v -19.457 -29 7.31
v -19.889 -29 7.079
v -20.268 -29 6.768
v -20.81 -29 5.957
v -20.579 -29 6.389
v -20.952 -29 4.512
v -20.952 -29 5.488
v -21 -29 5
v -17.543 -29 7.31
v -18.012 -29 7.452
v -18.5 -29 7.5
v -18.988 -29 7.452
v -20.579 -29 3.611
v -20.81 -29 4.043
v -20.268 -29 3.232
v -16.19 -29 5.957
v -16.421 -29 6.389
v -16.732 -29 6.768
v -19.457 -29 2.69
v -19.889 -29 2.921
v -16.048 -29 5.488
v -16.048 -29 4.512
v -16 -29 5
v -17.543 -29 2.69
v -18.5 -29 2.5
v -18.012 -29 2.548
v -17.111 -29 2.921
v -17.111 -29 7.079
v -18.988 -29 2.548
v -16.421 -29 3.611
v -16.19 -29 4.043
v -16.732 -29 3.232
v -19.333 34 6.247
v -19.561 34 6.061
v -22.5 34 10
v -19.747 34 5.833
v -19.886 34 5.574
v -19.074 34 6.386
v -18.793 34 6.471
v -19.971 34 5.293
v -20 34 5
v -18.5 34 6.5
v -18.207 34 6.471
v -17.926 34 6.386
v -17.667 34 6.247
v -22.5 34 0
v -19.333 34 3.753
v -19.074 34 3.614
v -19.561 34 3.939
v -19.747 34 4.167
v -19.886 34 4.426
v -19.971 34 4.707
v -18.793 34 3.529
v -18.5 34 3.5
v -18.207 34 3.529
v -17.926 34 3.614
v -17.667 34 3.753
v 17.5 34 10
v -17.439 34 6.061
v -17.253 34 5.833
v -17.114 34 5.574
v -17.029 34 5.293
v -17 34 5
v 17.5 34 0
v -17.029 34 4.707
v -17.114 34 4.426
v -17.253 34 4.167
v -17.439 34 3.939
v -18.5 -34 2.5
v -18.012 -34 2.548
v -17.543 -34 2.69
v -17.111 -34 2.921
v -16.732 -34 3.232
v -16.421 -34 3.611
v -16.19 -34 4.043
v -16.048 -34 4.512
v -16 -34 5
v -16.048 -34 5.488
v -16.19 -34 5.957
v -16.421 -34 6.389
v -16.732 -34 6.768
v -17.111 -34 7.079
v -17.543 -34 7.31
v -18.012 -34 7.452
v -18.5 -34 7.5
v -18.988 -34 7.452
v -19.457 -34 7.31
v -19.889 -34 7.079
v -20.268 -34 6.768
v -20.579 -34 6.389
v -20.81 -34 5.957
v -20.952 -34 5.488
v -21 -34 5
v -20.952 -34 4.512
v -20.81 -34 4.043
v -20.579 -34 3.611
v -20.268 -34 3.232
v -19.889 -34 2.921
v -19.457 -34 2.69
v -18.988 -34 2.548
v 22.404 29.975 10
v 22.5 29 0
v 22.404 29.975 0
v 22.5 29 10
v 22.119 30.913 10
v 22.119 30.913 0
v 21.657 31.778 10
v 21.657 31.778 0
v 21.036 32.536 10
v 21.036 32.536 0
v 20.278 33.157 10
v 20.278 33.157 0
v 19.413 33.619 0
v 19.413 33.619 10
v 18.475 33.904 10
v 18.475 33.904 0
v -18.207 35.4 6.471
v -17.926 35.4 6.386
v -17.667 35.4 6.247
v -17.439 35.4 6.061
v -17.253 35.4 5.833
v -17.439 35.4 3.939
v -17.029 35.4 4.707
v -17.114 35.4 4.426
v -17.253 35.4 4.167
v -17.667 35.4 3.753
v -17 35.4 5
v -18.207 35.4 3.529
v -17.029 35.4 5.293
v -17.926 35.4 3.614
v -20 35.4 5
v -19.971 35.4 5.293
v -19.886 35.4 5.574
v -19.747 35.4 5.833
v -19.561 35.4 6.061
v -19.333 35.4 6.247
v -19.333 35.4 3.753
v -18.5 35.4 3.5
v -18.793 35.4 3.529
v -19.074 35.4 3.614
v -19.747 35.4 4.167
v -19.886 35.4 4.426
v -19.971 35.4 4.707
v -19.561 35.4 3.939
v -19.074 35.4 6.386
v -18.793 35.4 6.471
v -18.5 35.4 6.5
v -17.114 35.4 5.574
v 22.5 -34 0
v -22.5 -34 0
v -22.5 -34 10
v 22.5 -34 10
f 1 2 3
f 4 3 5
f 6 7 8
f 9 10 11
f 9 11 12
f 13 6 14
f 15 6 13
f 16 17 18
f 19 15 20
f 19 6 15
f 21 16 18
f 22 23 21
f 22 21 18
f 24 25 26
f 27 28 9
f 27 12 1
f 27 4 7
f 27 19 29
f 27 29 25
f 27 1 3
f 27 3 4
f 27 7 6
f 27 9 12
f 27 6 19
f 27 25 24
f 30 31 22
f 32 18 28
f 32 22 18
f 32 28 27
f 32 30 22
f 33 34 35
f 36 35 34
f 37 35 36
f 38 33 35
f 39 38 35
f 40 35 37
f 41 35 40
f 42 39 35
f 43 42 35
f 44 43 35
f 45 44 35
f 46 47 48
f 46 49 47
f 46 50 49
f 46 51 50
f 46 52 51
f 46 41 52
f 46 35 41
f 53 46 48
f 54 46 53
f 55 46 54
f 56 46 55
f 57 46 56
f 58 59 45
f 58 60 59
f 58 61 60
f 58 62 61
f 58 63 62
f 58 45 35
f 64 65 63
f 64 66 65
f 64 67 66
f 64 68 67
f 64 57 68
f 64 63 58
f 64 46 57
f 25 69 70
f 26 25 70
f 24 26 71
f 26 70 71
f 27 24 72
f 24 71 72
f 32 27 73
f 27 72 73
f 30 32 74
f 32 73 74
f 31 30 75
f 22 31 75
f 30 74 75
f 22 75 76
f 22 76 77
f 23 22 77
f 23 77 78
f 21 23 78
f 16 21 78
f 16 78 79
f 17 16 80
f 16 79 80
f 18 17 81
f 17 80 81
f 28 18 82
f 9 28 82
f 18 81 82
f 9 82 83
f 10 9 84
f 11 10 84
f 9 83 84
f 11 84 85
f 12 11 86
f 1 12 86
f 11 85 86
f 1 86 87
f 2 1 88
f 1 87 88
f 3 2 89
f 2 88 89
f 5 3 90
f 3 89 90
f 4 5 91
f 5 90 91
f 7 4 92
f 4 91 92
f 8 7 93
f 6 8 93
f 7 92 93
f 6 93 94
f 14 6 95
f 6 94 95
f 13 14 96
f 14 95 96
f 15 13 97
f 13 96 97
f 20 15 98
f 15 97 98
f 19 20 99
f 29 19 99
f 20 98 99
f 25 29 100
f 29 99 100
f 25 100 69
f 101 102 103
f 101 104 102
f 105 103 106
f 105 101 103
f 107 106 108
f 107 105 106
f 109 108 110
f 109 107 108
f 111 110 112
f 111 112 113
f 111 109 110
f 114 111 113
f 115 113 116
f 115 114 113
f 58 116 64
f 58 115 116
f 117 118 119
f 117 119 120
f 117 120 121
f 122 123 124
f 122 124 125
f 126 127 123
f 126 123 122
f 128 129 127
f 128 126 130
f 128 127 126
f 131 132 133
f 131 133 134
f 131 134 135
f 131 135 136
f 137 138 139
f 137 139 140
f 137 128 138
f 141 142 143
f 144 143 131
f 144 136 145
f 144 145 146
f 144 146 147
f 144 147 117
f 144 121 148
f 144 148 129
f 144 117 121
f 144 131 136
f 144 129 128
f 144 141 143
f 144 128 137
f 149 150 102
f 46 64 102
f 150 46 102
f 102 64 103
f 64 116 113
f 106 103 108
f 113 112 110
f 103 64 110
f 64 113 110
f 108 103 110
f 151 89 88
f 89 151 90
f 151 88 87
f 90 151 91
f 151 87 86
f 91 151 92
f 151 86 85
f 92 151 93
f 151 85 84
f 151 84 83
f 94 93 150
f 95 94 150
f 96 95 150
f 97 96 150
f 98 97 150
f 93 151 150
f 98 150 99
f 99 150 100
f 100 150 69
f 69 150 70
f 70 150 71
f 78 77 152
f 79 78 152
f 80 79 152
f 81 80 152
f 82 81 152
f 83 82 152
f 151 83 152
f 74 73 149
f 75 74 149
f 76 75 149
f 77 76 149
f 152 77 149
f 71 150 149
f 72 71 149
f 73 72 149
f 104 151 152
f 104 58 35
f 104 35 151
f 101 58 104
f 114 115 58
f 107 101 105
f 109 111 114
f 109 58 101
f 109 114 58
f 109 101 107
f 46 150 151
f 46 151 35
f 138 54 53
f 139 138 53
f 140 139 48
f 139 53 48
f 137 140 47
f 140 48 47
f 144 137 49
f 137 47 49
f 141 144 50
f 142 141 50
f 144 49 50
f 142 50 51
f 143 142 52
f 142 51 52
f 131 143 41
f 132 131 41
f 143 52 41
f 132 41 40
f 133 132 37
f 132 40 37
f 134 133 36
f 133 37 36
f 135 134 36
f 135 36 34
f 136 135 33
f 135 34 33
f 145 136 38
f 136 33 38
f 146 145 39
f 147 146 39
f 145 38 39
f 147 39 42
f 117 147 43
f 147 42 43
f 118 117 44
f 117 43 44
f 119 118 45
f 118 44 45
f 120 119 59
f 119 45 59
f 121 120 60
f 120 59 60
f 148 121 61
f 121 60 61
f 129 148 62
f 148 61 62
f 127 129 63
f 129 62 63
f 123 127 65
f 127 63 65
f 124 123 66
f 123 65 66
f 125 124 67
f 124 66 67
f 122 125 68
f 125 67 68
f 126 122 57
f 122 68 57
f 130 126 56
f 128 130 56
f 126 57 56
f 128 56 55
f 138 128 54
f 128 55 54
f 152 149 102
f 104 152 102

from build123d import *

# Parameters (mm, degrees)
SKETCH_1_W           = 45
SKETCH_1_H           = 68
EXTRUDE_1_DEPTH      = 10
FILLET_1_R           = 5
SKETCH_2_R           = 1.5
EXTRUDE_2_DEPTH      = 1.4
SKETCH_3_OUTSIDE_W   = 63.662
SKETCH_3_OUTSIDE_H   = 28.662
SKETCH_3_OUTSIDE_W_2 = 45
SKETCH_3_OUTSIDE_H_2 = 10
SKETCH_3_OUTSIDE_R   = 2.5
CUT_EXTRUDE_1_DEPTH  = 5


with BuildPart() as part:
    # 草图1 → 凸台-拉伸1 (new body)
    with BuildSketch(Plane.XY):
        Rectangle(SKETCH_1_W, SKETCH_1_H)
    extrude(amount=EXTRUDE_1_DEPTH)

    # 圆角1
    fillet_1_edges = [part.edges().sort_by_distance(p)[0] for p in [
        (22.5, 34, 5),
    ]]
    fillet(fillet_1_edges, radius=FILLET_1_R)

    # 草图2 → 凸台-拉伸2 (add)
    with BuildSketch(Plane(origin=(0, 34, 0), x_dir=(1, 0, 0), z_dir=(0, 1, 0))):
        with Locations(Location((-18.5, -5, 0), (0, 0, 90))):
            Circle(SKETCH_2_R)
    extrude(amount=EXTRUDE_2_DEPTH)

    # 草图3 outside → 切除-拉伸1 (cut)
    # profile 1 of 2: a face of its own
    with BuildSketch(Plane.XZ.offset(34)):
        with Locations((0, 5)):
            Rectangle(SKETCH_3_OUTSIDE_W, SKETCH_3_OUTSIDE_H)
        with Locations((0, 5)):
            Rectangle(SKETCH_3_OUTSIDE_W_2, SKETCH_3_OUTSIDE_H_2, mode=Mode.SUBTRACT)
    # profile 2 of 2: a face of its own
    with BuildSketch(Plane.XZ.offset(34)):
        with Locations(Location((-18.5, 5, 0), (0, 0, 270))):
            Circle(SKETCH_3_OUTSIDE_R)
    extrude(amount=-CUT_EXTRUDE_1_DEPTH, mode=Mode.SUBTRACT)


solid = part.part
